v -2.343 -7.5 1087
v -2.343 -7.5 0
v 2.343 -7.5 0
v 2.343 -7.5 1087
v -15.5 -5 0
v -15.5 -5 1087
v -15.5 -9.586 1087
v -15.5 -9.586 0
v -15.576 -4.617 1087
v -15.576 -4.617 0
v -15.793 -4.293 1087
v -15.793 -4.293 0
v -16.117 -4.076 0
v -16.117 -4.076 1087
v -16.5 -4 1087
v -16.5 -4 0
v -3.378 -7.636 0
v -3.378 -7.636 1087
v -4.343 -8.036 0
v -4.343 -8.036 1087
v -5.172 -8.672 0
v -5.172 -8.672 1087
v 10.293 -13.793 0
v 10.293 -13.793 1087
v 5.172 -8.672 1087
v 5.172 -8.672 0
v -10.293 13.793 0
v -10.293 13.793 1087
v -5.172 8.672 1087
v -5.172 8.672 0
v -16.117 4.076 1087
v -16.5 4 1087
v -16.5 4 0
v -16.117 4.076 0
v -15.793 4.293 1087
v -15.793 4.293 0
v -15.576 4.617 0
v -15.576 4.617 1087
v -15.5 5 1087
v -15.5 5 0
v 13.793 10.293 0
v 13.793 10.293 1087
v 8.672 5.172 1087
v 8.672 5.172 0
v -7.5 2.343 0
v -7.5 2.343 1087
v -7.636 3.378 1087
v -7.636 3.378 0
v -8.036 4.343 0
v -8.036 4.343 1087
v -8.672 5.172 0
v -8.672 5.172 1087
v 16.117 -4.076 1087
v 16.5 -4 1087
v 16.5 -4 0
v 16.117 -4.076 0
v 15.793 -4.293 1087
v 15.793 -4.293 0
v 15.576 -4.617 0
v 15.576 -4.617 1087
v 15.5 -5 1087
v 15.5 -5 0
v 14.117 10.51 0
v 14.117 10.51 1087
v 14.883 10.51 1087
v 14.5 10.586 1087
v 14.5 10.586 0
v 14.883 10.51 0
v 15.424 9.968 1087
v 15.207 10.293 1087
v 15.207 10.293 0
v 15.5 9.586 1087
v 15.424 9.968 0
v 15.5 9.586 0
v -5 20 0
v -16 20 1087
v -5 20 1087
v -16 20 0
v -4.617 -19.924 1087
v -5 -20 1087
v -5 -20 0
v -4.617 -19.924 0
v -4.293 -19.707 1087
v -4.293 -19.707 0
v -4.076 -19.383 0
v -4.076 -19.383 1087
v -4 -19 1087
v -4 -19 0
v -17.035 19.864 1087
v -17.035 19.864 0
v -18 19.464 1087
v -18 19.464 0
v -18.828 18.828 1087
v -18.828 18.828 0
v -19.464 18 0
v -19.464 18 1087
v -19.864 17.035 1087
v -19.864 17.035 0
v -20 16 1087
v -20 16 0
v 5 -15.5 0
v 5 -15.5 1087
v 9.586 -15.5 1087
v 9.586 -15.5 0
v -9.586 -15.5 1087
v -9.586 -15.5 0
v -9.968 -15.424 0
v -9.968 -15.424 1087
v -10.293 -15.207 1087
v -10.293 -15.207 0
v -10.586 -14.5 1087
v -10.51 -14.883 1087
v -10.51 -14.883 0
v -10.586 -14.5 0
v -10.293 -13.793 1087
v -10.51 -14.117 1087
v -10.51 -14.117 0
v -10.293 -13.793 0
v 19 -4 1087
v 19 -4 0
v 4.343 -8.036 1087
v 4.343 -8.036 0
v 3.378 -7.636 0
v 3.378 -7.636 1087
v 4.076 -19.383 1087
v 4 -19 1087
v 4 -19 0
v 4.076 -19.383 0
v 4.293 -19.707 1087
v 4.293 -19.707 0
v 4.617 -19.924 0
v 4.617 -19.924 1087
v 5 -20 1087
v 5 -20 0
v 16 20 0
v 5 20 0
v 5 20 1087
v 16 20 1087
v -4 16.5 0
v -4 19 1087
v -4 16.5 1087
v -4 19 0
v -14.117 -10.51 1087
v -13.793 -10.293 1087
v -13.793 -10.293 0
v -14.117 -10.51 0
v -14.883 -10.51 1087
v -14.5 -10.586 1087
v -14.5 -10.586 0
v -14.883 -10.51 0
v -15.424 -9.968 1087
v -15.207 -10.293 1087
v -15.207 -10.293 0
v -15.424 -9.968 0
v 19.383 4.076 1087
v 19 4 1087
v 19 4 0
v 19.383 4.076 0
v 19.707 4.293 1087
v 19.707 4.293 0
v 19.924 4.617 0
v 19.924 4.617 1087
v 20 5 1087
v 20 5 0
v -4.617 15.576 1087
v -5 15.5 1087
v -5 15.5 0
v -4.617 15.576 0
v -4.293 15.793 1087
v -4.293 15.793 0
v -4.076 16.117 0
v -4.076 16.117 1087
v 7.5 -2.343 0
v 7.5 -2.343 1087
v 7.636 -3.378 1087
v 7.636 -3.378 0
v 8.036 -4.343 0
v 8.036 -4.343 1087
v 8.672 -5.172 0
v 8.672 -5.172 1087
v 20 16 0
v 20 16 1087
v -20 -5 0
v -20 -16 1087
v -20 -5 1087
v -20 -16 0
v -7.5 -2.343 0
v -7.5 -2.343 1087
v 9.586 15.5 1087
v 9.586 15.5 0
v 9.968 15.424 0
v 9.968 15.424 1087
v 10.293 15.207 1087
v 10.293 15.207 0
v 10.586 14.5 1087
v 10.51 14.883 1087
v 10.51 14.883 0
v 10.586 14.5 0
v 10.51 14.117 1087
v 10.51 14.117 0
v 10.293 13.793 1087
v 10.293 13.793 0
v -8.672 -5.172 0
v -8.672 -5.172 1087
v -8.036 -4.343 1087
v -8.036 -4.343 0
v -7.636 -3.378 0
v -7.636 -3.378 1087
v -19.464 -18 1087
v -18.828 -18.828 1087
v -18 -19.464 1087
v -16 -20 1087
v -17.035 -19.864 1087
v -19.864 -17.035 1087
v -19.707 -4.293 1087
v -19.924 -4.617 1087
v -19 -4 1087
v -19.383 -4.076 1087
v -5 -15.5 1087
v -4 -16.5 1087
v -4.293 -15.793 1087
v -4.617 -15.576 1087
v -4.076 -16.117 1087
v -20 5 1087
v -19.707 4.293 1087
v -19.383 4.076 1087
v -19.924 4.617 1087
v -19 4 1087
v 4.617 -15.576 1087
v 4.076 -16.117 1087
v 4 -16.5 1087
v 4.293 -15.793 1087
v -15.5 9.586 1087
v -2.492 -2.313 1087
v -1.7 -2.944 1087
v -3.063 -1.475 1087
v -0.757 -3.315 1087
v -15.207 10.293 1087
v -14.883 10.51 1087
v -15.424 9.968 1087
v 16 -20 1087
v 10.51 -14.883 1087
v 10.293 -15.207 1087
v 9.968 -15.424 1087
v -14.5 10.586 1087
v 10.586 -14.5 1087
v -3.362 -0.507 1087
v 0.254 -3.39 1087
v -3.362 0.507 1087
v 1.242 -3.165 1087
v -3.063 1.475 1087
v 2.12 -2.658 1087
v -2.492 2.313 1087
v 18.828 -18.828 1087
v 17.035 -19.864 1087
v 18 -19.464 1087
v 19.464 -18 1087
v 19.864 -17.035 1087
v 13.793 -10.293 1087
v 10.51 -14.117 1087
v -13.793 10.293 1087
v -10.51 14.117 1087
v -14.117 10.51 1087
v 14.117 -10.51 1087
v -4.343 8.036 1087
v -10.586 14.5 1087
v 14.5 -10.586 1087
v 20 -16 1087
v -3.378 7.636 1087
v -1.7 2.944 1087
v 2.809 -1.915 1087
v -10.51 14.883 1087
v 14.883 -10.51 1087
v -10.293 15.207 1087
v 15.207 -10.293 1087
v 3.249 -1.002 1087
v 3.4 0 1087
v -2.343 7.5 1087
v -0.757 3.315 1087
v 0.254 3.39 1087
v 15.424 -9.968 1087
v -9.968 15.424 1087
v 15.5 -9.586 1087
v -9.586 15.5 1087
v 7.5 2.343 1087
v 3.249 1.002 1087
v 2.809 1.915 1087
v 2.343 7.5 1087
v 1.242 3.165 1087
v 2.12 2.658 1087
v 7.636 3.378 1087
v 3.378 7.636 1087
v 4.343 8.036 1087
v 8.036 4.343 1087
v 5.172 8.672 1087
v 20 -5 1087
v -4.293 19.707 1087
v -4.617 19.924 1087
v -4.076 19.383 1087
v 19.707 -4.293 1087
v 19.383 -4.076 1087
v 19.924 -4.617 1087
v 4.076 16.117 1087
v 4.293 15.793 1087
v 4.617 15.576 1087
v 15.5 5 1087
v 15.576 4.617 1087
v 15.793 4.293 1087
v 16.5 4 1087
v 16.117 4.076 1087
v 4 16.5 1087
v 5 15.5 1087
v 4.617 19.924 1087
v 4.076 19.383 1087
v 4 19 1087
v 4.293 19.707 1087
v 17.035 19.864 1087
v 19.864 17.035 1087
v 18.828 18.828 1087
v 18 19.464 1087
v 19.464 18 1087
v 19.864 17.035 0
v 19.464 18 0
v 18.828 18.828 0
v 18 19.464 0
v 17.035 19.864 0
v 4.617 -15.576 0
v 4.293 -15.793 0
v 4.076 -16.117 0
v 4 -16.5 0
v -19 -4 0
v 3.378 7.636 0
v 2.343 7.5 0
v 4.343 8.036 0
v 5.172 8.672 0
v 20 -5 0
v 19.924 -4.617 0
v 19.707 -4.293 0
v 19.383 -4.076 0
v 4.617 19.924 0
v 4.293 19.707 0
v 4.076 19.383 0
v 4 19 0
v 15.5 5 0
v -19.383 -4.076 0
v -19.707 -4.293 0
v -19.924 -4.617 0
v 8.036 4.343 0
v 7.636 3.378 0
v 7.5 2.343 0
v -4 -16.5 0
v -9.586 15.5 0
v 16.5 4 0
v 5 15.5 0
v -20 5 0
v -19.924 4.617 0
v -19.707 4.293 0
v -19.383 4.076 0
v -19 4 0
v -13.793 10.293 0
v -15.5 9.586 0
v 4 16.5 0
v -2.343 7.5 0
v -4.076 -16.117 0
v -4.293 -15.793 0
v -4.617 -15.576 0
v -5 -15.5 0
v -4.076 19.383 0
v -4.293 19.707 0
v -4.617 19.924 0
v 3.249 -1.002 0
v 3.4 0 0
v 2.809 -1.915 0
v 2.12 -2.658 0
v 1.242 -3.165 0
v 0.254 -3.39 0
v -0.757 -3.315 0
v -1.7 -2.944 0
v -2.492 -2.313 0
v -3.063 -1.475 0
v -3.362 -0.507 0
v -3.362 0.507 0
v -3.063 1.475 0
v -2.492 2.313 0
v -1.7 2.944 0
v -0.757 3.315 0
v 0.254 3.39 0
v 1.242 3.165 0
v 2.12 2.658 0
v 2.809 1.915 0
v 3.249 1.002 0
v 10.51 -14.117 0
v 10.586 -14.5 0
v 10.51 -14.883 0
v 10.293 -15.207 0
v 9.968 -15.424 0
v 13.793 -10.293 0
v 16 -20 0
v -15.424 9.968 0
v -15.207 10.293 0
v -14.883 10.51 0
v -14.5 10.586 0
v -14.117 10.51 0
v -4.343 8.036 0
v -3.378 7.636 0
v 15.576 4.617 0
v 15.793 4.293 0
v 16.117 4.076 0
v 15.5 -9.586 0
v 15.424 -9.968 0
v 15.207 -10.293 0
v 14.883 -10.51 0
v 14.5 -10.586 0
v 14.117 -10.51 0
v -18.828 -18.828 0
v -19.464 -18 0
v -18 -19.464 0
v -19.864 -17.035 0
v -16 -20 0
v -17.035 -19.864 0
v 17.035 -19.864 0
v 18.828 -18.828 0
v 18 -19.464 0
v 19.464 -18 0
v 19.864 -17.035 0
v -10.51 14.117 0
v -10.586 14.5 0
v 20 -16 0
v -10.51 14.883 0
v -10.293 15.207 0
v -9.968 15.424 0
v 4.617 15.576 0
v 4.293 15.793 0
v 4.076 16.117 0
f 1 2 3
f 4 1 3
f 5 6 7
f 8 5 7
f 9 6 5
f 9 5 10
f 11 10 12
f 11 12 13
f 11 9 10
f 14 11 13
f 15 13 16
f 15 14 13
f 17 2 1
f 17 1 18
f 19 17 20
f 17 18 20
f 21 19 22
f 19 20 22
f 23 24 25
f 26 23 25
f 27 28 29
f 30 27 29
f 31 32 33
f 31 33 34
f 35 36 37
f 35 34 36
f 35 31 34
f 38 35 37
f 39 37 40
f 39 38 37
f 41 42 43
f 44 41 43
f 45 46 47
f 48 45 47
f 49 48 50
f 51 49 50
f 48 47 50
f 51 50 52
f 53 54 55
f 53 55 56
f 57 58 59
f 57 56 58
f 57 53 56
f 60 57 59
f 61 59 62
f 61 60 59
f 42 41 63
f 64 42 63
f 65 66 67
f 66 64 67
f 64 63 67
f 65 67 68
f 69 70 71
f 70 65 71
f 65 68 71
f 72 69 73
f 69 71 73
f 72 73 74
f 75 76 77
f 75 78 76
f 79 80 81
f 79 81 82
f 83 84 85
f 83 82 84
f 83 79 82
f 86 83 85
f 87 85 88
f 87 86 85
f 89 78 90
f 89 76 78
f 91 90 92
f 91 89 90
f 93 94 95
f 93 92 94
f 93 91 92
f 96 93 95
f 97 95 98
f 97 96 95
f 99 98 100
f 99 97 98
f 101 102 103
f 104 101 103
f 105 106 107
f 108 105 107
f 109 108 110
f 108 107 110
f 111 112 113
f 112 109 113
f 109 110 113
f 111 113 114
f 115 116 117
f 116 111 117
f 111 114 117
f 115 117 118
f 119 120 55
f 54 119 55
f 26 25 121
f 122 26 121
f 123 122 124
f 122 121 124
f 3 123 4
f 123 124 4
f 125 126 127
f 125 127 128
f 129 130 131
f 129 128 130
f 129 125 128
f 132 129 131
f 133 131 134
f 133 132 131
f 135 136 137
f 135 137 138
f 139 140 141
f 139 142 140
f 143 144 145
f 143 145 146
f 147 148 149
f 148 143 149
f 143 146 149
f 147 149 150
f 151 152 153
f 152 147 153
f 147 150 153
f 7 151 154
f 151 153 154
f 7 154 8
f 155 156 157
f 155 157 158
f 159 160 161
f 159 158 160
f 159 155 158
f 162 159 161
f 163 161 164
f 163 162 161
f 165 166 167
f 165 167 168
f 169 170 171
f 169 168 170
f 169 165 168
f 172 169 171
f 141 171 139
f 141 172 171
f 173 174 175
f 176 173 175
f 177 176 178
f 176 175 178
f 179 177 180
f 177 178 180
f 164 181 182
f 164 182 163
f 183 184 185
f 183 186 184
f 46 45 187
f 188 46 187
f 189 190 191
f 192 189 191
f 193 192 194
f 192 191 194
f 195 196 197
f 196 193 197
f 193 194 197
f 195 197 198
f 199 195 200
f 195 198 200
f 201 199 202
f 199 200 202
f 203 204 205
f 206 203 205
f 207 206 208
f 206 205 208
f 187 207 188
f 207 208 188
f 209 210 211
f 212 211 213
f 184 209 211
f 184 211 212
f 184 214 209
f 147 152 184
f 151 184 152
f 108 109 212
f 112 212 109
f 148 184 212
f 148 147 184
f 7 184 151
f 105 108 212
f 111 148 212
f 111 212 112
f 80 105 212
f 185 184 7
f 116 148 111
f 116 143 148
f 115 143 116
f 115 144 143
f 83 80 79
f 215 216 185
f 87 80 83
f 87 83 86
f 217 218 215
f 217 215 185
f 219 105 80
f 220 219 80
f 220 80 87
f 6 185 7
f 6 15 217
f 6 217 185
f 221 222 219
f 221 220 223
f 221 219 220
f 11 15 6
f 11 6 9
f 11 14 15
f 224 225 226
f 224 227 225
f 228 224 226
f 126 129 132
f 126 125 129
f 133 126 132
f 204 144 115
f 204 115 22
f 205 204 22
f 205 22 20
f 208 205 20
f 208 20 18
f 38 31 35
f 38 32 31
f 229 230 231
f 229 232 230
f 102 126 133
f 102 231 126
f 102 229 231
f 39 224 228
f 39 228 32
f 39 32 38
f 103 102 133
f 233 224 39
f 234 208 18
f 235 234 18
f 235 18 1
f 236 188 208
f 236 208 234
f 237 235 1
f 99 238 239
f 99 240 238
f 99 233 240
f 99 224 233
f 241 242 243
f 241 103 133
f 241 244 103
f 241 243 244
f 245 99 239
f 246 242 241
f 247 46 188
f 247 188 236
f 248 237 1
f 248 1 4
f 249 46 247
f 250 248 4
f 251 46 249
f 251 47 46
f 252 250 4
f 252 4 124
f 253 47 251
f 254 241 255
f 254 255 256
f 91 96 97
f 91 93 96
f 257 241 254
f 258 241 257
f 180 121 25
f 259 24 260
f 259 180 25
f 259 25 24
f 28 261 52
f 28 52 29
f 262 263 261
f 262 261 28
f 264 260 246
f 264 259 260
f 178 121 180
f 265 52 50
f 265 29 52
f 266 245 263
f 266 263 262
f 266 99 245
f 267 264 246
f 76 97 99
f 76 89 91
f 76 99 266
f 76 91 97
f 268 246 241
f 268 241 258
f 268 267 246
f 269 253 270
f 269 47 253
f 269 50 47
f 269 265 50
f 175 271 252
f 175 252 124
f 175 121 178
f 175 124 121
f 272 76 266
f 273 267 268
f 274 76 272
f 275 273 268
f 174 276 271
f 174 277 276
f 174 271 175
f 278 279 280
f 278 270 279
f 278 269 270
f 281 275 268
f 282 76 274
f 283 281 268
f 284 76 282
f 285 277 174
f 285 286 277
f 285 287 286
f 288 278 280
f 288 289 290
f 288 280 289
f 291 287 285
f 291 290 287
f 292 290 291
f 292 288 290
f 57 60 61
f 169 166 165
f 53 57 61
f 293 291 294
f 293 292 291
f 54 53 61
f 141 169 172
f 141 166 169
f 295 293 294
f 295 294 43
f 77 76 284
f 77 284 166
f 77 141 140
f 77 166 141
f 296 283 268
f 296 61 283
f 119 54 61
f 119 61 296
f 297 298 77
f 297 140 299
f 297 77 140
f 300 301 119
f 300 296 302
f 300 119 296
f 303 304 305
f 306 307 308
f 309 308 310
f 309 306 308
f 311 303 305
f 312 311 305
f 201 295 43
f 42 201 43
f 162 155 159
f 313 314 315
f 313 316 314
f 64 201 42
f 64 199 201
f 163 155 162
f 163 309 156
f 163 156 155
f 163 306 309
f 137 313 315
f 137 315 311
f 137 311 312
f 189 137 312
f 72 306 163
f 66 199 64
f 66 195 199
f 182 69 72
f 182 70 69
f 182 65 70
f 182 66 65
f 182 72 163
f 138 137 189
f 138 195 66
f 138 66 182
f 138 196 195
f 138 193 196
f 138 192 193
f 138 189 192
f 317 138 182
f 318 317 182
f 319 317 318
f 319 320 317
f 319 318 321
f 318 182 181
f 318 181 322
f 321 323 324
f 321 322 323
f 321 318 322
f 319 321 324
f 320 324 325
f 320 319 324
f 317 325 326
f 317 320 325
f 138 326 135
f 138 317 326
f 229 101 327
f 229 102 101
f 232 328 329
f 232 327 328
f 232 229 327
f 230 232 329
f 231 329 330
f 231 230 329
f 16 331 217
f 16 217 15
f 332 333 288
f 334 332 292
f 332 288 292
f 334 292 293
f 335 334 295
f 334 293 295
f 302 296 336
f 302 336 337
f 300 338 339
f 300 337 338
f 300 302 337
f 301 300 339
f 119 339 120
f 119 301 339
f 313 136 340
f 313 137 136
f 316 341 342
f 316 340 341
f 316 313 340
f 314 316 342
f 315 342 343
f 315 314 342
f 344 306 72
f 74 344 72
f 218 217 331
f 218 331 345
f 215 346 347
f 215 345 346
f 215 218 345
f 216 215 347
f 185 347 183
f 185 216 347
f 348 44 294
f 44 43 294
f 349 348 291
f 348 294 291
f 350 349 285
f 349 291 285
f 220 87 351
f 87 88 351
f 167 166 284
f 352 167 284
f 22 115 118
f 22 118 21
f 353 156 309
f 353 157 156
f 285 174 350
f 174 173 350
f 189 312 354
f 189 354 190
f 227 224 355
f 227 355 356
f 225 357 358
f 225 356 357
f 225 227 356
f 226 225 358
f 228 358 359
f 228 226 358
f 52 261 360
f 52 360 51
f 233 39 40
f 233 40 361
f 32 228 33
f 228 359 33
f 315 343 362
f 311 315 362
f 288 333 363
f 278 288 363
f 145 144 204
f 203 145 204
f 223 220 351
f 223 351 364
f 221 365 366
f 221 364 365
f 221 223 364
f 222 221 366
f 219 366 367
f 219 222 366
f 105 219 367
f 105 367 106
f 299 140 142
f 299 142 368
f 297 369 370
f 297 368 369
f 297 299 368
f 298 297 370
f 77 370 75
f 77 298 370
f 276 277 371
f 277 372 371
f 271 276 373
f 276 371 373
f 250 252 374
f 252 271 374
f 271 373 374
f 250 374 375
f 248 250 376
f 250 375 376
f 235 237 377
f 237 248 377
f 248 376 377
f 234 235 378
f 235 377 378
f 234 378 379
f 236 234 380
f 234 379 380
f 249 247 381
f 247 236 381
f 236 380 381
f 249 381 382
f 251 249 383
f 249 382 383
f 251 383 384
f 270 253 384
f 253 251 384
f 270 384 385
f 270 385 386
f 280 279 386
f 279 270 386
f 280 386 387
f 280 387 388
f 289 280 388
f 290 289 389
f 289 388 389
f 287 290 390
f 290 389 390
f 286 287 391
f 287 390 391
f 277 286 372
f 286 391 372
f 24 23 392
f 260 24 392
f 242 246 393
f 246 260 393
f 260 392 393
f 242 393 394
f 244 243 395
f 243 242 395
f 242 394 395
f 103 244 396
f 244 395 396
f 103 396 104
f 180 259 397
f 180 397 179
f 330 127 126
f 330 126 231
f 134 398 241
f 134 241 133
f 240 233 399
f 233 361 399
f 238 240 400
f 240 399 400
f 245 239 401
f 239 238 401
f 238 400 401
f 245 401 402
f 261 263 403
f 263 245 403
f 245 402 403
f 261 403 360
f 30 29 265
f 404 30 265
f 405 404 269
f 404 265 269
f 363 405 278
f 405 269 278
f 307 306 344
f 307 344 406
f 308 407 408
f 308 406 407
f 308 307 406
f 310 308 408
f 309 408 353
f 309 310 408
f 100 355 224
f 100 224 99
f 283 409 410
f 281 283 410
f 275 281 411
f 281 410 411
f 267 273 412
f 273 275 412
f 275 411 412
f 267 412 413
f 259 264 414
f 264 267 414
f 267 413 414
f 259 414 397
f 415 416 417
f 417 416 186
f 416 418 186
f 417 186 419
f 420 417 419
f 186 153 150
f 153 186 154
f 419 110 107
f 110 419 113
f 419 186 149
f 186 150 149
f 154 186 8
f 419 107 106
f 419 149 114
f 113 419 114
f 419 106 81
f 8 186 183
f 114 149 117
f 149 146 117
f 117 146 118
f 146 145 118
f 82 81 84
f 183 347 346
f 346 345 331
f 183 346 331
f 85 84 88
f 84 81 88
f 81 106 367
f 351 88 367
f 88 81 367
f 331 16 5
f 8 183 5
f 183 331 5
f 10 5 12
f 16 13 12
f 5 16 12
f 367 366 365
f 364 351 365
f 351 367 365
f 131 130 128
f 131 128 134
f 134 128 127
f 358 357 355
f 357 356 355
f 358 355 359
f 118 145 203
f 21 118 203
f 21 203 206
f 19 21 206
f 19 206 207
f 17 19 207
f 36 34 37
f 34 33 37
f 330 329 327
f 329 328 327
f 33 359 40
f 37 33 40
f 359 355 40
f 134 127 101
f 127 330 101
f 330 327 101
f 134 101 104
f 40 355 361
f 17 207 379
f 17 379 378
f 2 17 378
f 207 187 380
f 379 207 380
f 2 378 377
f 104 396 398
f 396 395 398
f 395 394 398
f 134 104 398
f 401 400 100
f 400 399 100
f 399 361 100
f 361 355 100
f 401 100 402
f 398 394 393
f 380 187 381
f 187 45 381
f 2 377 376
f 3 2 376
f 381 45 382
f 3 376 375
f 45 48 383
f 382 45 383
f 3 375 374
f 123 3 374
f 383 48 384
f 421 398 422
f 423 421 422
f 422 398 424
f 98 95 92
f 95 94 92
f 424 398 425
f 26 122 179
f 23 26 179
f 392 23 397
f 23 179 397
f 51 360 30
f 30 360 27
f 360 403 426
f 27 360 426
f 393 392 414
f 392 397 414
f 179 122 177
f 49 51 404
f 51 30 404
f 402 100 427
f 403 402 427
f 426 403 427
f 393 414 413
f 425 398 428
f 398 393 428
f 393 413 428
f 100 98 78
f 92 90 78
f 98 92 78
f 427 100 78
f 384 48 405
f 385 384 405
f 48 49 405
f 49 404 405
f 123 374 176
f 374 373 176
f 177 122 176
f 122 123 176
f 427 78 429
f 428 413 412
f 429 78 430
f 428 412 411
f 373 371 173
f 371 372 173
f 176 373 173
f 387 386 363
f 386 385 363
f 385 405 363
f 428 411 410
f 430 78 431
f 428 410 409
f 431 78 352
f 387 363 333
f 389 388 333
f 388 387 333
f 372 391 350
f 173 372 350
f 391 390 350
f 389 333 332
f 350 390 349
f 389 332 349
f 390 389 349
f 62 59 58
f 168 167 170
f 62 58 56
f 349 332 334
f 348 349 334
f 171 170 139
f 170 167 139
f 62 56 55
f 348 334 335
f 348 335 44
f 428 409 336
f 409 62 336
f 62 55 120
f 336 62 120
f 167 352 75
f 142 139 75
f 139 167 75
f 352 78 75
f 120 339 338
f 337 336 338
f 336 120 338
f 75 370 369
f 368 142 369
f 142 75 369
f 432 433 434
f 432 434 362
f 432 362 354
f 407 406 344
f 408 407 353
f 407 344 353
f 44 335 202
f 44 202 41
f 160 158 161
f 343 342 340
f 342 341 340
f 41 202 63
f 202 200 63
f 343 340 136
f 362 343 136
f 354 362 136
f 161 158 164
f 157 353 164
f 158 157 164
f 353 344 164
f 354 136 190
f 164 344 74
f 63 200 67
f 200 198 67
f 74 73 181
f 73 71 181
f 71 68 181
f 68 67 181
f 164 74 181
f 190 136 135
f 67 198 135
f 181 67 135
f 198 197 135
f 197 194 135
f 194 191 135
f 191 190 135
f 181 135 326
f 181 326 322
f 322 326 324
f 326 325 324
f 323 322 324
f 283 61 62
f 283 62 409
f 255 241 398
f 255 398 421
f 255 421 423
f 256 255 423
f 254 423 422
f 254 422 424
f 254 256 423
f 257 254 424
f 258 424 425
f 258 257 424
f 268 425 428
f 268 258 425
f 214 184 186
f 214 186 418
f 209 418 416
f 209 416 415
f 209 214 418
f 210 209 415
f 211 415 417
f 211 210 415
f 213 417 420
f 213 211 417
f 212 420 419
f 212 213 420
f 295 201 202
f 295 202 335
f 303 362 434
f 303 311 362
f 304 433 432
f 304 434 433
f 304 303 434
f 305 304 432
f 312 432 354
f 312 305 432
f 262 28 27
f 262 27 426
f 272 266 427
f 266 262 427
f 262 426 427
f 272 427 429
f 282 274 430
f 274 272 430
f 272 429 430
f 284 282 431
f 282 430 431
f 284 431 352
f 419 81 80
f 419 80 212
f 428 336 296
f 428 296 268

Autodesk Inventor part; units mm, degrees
ref_plane "YZ Plane" through (0, 0, 0) normal (1, 0, 0) x (0, 1, 0)
ref_plane "XZ Plane" through (0, 0, 0) normal (0, 1, 0) x (-1, 0, 0)
ref_plane "XY Plane" through (0, 0, 0) normal (0, 0, 1) x (1, 0, 0)
sketch "T-Slot 4040 Base" plane through (0, 0, 0) normal (0, 0, 1) x (1, 0, 0)
  line L0 (-28, 0) -> (28, 0) construction
  line L1 (0, -28) -> (0, 28) construction
  circle A0 centre (0, 0) radius 3.4
  line L2 (-7.5, -7.5) -> (7.5, -7.5)
  line L3 (7.5, -7.5) -> (7.5, 7.5)
  line L4 (7.5, 7.5) -> (-7.5, 7.5)
  line L5 (-7.5, 7.5) -> (-7.5, -7.5)
  line L6 (-7.5, -7.5) -> (7.5, 7.5) construction
  line L7 (7.5, -7.5) -> (-7.5, 7.5) construction
  line L8 (20, 4) -> (15.5, 4)
  line L9 (15.5, 4) -> (15.5, 12)
  line L10 (15.5, 12) -> (7.5, 4)
  line L11 (4, 20) -> (4, 15.5)
  line L12 (4, 15.5) -> (12, 15.5)
  line L13 (12, 15.5) -> (4, 7.5)
  line L14 (7.5, -7.5) -> (-7.5, -7.5)
  arc A1 (15.5, 9.5858) -> (13.7929, 10.2929) centre (14.5, 9.5858) ccw
  arc A2 (10.2929, 13.7929) -> (9.5858, 15.5) centre (9.5858, 14.5) ccw
  line L15 (-20, 20) -> (20, 20)
  line L16 (20, 20) -> (20, -20)
  line L17 (20, -20) -> (-20, -20)
  line L18 (-20, -20) -> (-20, 20)
  line L19 (-20, 20) -> (20, -20) construction
  line L20 (20, 20) -> (-20, -20) construction
  line L21 (-4, 15.5) -> (-12, 15.5)
  arc A3 (-9.5858, 15.5) -> (-10.2929, 13.7929) centre (-9.5858, 14.5) ccw
  line L22 (-12, 15.5) -> (-4, 7.5)
  line L23 (-15.5, 12) -> (-7.5, 4)
  line L24 (-20, 4) -> (-15.5, 4)
  arc A4 (-13.7929, 10.2929) -> (-15.5, 9.5858) centre (-14.5, 9.5858) ccw
  line L25 (-15.5, 4) -> (-15.5, 12)
  line L26 (-4, 20) -> (-4, 15.5)
  line L27 (-15.5, -4) -> (-15.5, -12)
  arc A5 (-15.5, -9.5858) -> (-13.7929, -10.2929) centre (-14.5, -9.5858) ccw
  line L28 (-15.5, -12) -> (-7.5, -4)
  line L29 (-12, -15.5) -> (-4, -7.5)
  line L30 (-4, -20) -> (-4, -15.5)
  arc A6 (-10.2929, -13.7929) -> (-9.5858, -15.5) centre (-9.5858, -14.5) ccw
  line L31 (-4, -15.5) -> (-12, -15.5)
  line L32 (-20, -4) -> (-15.5, -4)
  line L33 (4, -15.5) -> (12, -15.5)
  arc A7 (9.5858, -15.5) -> (10.2929, -13.7929) centre (9.5858, -14.5) ccw
  line L34 (12, -15.5) -> (4, -7.5)
  line L35 (15.5, -12) -> (7.5, -4)
  line L36 (20, -4) -> (15.5, -4)
  arc A8 (13.7929, -10.2929) -> (15.5, -9.5858) centre (14.5, -9.5858) ccw
  line L37 (15.5, -4) -> (15.5, -12)
  line L38 (4, -20) -> (4, -15.5)
  point P0 (4.9274, 7.75)
  point P1 (9.5858, 15.5)
  point P2 (-20, 20)
  point P3 (-7.5, -7.5)
  point P4 (-20, -20)
  point P5 (7.5, -7.5)
  point P6 (20, -20)
  point P7 (-9.5858, -15.5)
  point P8 (-4, -7.5)
  point P9 (15.5, -9.5858)
  point P10 (7.5, -4)
  point P11 (-15.5, 9.5858)
  point P12 (-4, 7.5)
  dimension "d35" = 6.8
  dimension "d37" = 12
  dimension "d38" = 1
  dimension "d43" = 40
  dimension "d44" = 40
  dimension "d45" = 4.5
  dimension "d46" = 4
  dimension "d53" = 360
extrude "Extrusion1" add sketch "T-Slot 4040 Base" along normal blind 1087 contours L5 L4 L3 L2 | L2 L29 L31 L30 L17 L18 L32 L27 L28 L5 | L2 L3 L35 L37 L36 L16 L17 L38 L33 L34 | A6 L31 L29 | L23 L25 L24 L18 L15 L26 L21 L22 L4 L5 | L28 L27 A5 | L34 L33 A7 | A4 L25 L23 | L3 L4 L13 L12 L11 L15 L16 L8 L9 L10 | A8 L37 L35 | L22 L21 A3 | L10 L9 A1 | A2 L12 L13
fillet "Rundung1" radius 1 16 edges at (4, 15.5, 543.5) (15.5, 4, 543.5) (20, 4, 543.5) (4, 20, 543.5) (-20, 4, 543.5) (-15.5, 4, 543.5) (-4, 15.5, 543.5) (-4, 20, 543.5) (-4, -15.5, 543.5) (-4, -20, 543.5) (4, -15.5, 543.5) (4, -20, 543.5) (15.5, -4, 543.5) (20, -4, 543.5) (-20, -4, 543.5) (-15.5, -4, 543.5)
fillet "Rundung2" radius 4 12 edges at (4, 7.5, 543.5) (7.5, 4, 543.5) (-20, 20, 543.5) (-20, -20, 543.5) (20, 20, 543.5) (20, -20, 543.5) (7.5, -4, 543.5) (-7.5, -4, 543.5) (-7.5, 4, 543.5) (4, -7.5, 543.5) (-4, -7.5, 543.5) (-4, 7.5, 543.5)
properties part number "T-SLOT 4040 B-Type 1087mm"
